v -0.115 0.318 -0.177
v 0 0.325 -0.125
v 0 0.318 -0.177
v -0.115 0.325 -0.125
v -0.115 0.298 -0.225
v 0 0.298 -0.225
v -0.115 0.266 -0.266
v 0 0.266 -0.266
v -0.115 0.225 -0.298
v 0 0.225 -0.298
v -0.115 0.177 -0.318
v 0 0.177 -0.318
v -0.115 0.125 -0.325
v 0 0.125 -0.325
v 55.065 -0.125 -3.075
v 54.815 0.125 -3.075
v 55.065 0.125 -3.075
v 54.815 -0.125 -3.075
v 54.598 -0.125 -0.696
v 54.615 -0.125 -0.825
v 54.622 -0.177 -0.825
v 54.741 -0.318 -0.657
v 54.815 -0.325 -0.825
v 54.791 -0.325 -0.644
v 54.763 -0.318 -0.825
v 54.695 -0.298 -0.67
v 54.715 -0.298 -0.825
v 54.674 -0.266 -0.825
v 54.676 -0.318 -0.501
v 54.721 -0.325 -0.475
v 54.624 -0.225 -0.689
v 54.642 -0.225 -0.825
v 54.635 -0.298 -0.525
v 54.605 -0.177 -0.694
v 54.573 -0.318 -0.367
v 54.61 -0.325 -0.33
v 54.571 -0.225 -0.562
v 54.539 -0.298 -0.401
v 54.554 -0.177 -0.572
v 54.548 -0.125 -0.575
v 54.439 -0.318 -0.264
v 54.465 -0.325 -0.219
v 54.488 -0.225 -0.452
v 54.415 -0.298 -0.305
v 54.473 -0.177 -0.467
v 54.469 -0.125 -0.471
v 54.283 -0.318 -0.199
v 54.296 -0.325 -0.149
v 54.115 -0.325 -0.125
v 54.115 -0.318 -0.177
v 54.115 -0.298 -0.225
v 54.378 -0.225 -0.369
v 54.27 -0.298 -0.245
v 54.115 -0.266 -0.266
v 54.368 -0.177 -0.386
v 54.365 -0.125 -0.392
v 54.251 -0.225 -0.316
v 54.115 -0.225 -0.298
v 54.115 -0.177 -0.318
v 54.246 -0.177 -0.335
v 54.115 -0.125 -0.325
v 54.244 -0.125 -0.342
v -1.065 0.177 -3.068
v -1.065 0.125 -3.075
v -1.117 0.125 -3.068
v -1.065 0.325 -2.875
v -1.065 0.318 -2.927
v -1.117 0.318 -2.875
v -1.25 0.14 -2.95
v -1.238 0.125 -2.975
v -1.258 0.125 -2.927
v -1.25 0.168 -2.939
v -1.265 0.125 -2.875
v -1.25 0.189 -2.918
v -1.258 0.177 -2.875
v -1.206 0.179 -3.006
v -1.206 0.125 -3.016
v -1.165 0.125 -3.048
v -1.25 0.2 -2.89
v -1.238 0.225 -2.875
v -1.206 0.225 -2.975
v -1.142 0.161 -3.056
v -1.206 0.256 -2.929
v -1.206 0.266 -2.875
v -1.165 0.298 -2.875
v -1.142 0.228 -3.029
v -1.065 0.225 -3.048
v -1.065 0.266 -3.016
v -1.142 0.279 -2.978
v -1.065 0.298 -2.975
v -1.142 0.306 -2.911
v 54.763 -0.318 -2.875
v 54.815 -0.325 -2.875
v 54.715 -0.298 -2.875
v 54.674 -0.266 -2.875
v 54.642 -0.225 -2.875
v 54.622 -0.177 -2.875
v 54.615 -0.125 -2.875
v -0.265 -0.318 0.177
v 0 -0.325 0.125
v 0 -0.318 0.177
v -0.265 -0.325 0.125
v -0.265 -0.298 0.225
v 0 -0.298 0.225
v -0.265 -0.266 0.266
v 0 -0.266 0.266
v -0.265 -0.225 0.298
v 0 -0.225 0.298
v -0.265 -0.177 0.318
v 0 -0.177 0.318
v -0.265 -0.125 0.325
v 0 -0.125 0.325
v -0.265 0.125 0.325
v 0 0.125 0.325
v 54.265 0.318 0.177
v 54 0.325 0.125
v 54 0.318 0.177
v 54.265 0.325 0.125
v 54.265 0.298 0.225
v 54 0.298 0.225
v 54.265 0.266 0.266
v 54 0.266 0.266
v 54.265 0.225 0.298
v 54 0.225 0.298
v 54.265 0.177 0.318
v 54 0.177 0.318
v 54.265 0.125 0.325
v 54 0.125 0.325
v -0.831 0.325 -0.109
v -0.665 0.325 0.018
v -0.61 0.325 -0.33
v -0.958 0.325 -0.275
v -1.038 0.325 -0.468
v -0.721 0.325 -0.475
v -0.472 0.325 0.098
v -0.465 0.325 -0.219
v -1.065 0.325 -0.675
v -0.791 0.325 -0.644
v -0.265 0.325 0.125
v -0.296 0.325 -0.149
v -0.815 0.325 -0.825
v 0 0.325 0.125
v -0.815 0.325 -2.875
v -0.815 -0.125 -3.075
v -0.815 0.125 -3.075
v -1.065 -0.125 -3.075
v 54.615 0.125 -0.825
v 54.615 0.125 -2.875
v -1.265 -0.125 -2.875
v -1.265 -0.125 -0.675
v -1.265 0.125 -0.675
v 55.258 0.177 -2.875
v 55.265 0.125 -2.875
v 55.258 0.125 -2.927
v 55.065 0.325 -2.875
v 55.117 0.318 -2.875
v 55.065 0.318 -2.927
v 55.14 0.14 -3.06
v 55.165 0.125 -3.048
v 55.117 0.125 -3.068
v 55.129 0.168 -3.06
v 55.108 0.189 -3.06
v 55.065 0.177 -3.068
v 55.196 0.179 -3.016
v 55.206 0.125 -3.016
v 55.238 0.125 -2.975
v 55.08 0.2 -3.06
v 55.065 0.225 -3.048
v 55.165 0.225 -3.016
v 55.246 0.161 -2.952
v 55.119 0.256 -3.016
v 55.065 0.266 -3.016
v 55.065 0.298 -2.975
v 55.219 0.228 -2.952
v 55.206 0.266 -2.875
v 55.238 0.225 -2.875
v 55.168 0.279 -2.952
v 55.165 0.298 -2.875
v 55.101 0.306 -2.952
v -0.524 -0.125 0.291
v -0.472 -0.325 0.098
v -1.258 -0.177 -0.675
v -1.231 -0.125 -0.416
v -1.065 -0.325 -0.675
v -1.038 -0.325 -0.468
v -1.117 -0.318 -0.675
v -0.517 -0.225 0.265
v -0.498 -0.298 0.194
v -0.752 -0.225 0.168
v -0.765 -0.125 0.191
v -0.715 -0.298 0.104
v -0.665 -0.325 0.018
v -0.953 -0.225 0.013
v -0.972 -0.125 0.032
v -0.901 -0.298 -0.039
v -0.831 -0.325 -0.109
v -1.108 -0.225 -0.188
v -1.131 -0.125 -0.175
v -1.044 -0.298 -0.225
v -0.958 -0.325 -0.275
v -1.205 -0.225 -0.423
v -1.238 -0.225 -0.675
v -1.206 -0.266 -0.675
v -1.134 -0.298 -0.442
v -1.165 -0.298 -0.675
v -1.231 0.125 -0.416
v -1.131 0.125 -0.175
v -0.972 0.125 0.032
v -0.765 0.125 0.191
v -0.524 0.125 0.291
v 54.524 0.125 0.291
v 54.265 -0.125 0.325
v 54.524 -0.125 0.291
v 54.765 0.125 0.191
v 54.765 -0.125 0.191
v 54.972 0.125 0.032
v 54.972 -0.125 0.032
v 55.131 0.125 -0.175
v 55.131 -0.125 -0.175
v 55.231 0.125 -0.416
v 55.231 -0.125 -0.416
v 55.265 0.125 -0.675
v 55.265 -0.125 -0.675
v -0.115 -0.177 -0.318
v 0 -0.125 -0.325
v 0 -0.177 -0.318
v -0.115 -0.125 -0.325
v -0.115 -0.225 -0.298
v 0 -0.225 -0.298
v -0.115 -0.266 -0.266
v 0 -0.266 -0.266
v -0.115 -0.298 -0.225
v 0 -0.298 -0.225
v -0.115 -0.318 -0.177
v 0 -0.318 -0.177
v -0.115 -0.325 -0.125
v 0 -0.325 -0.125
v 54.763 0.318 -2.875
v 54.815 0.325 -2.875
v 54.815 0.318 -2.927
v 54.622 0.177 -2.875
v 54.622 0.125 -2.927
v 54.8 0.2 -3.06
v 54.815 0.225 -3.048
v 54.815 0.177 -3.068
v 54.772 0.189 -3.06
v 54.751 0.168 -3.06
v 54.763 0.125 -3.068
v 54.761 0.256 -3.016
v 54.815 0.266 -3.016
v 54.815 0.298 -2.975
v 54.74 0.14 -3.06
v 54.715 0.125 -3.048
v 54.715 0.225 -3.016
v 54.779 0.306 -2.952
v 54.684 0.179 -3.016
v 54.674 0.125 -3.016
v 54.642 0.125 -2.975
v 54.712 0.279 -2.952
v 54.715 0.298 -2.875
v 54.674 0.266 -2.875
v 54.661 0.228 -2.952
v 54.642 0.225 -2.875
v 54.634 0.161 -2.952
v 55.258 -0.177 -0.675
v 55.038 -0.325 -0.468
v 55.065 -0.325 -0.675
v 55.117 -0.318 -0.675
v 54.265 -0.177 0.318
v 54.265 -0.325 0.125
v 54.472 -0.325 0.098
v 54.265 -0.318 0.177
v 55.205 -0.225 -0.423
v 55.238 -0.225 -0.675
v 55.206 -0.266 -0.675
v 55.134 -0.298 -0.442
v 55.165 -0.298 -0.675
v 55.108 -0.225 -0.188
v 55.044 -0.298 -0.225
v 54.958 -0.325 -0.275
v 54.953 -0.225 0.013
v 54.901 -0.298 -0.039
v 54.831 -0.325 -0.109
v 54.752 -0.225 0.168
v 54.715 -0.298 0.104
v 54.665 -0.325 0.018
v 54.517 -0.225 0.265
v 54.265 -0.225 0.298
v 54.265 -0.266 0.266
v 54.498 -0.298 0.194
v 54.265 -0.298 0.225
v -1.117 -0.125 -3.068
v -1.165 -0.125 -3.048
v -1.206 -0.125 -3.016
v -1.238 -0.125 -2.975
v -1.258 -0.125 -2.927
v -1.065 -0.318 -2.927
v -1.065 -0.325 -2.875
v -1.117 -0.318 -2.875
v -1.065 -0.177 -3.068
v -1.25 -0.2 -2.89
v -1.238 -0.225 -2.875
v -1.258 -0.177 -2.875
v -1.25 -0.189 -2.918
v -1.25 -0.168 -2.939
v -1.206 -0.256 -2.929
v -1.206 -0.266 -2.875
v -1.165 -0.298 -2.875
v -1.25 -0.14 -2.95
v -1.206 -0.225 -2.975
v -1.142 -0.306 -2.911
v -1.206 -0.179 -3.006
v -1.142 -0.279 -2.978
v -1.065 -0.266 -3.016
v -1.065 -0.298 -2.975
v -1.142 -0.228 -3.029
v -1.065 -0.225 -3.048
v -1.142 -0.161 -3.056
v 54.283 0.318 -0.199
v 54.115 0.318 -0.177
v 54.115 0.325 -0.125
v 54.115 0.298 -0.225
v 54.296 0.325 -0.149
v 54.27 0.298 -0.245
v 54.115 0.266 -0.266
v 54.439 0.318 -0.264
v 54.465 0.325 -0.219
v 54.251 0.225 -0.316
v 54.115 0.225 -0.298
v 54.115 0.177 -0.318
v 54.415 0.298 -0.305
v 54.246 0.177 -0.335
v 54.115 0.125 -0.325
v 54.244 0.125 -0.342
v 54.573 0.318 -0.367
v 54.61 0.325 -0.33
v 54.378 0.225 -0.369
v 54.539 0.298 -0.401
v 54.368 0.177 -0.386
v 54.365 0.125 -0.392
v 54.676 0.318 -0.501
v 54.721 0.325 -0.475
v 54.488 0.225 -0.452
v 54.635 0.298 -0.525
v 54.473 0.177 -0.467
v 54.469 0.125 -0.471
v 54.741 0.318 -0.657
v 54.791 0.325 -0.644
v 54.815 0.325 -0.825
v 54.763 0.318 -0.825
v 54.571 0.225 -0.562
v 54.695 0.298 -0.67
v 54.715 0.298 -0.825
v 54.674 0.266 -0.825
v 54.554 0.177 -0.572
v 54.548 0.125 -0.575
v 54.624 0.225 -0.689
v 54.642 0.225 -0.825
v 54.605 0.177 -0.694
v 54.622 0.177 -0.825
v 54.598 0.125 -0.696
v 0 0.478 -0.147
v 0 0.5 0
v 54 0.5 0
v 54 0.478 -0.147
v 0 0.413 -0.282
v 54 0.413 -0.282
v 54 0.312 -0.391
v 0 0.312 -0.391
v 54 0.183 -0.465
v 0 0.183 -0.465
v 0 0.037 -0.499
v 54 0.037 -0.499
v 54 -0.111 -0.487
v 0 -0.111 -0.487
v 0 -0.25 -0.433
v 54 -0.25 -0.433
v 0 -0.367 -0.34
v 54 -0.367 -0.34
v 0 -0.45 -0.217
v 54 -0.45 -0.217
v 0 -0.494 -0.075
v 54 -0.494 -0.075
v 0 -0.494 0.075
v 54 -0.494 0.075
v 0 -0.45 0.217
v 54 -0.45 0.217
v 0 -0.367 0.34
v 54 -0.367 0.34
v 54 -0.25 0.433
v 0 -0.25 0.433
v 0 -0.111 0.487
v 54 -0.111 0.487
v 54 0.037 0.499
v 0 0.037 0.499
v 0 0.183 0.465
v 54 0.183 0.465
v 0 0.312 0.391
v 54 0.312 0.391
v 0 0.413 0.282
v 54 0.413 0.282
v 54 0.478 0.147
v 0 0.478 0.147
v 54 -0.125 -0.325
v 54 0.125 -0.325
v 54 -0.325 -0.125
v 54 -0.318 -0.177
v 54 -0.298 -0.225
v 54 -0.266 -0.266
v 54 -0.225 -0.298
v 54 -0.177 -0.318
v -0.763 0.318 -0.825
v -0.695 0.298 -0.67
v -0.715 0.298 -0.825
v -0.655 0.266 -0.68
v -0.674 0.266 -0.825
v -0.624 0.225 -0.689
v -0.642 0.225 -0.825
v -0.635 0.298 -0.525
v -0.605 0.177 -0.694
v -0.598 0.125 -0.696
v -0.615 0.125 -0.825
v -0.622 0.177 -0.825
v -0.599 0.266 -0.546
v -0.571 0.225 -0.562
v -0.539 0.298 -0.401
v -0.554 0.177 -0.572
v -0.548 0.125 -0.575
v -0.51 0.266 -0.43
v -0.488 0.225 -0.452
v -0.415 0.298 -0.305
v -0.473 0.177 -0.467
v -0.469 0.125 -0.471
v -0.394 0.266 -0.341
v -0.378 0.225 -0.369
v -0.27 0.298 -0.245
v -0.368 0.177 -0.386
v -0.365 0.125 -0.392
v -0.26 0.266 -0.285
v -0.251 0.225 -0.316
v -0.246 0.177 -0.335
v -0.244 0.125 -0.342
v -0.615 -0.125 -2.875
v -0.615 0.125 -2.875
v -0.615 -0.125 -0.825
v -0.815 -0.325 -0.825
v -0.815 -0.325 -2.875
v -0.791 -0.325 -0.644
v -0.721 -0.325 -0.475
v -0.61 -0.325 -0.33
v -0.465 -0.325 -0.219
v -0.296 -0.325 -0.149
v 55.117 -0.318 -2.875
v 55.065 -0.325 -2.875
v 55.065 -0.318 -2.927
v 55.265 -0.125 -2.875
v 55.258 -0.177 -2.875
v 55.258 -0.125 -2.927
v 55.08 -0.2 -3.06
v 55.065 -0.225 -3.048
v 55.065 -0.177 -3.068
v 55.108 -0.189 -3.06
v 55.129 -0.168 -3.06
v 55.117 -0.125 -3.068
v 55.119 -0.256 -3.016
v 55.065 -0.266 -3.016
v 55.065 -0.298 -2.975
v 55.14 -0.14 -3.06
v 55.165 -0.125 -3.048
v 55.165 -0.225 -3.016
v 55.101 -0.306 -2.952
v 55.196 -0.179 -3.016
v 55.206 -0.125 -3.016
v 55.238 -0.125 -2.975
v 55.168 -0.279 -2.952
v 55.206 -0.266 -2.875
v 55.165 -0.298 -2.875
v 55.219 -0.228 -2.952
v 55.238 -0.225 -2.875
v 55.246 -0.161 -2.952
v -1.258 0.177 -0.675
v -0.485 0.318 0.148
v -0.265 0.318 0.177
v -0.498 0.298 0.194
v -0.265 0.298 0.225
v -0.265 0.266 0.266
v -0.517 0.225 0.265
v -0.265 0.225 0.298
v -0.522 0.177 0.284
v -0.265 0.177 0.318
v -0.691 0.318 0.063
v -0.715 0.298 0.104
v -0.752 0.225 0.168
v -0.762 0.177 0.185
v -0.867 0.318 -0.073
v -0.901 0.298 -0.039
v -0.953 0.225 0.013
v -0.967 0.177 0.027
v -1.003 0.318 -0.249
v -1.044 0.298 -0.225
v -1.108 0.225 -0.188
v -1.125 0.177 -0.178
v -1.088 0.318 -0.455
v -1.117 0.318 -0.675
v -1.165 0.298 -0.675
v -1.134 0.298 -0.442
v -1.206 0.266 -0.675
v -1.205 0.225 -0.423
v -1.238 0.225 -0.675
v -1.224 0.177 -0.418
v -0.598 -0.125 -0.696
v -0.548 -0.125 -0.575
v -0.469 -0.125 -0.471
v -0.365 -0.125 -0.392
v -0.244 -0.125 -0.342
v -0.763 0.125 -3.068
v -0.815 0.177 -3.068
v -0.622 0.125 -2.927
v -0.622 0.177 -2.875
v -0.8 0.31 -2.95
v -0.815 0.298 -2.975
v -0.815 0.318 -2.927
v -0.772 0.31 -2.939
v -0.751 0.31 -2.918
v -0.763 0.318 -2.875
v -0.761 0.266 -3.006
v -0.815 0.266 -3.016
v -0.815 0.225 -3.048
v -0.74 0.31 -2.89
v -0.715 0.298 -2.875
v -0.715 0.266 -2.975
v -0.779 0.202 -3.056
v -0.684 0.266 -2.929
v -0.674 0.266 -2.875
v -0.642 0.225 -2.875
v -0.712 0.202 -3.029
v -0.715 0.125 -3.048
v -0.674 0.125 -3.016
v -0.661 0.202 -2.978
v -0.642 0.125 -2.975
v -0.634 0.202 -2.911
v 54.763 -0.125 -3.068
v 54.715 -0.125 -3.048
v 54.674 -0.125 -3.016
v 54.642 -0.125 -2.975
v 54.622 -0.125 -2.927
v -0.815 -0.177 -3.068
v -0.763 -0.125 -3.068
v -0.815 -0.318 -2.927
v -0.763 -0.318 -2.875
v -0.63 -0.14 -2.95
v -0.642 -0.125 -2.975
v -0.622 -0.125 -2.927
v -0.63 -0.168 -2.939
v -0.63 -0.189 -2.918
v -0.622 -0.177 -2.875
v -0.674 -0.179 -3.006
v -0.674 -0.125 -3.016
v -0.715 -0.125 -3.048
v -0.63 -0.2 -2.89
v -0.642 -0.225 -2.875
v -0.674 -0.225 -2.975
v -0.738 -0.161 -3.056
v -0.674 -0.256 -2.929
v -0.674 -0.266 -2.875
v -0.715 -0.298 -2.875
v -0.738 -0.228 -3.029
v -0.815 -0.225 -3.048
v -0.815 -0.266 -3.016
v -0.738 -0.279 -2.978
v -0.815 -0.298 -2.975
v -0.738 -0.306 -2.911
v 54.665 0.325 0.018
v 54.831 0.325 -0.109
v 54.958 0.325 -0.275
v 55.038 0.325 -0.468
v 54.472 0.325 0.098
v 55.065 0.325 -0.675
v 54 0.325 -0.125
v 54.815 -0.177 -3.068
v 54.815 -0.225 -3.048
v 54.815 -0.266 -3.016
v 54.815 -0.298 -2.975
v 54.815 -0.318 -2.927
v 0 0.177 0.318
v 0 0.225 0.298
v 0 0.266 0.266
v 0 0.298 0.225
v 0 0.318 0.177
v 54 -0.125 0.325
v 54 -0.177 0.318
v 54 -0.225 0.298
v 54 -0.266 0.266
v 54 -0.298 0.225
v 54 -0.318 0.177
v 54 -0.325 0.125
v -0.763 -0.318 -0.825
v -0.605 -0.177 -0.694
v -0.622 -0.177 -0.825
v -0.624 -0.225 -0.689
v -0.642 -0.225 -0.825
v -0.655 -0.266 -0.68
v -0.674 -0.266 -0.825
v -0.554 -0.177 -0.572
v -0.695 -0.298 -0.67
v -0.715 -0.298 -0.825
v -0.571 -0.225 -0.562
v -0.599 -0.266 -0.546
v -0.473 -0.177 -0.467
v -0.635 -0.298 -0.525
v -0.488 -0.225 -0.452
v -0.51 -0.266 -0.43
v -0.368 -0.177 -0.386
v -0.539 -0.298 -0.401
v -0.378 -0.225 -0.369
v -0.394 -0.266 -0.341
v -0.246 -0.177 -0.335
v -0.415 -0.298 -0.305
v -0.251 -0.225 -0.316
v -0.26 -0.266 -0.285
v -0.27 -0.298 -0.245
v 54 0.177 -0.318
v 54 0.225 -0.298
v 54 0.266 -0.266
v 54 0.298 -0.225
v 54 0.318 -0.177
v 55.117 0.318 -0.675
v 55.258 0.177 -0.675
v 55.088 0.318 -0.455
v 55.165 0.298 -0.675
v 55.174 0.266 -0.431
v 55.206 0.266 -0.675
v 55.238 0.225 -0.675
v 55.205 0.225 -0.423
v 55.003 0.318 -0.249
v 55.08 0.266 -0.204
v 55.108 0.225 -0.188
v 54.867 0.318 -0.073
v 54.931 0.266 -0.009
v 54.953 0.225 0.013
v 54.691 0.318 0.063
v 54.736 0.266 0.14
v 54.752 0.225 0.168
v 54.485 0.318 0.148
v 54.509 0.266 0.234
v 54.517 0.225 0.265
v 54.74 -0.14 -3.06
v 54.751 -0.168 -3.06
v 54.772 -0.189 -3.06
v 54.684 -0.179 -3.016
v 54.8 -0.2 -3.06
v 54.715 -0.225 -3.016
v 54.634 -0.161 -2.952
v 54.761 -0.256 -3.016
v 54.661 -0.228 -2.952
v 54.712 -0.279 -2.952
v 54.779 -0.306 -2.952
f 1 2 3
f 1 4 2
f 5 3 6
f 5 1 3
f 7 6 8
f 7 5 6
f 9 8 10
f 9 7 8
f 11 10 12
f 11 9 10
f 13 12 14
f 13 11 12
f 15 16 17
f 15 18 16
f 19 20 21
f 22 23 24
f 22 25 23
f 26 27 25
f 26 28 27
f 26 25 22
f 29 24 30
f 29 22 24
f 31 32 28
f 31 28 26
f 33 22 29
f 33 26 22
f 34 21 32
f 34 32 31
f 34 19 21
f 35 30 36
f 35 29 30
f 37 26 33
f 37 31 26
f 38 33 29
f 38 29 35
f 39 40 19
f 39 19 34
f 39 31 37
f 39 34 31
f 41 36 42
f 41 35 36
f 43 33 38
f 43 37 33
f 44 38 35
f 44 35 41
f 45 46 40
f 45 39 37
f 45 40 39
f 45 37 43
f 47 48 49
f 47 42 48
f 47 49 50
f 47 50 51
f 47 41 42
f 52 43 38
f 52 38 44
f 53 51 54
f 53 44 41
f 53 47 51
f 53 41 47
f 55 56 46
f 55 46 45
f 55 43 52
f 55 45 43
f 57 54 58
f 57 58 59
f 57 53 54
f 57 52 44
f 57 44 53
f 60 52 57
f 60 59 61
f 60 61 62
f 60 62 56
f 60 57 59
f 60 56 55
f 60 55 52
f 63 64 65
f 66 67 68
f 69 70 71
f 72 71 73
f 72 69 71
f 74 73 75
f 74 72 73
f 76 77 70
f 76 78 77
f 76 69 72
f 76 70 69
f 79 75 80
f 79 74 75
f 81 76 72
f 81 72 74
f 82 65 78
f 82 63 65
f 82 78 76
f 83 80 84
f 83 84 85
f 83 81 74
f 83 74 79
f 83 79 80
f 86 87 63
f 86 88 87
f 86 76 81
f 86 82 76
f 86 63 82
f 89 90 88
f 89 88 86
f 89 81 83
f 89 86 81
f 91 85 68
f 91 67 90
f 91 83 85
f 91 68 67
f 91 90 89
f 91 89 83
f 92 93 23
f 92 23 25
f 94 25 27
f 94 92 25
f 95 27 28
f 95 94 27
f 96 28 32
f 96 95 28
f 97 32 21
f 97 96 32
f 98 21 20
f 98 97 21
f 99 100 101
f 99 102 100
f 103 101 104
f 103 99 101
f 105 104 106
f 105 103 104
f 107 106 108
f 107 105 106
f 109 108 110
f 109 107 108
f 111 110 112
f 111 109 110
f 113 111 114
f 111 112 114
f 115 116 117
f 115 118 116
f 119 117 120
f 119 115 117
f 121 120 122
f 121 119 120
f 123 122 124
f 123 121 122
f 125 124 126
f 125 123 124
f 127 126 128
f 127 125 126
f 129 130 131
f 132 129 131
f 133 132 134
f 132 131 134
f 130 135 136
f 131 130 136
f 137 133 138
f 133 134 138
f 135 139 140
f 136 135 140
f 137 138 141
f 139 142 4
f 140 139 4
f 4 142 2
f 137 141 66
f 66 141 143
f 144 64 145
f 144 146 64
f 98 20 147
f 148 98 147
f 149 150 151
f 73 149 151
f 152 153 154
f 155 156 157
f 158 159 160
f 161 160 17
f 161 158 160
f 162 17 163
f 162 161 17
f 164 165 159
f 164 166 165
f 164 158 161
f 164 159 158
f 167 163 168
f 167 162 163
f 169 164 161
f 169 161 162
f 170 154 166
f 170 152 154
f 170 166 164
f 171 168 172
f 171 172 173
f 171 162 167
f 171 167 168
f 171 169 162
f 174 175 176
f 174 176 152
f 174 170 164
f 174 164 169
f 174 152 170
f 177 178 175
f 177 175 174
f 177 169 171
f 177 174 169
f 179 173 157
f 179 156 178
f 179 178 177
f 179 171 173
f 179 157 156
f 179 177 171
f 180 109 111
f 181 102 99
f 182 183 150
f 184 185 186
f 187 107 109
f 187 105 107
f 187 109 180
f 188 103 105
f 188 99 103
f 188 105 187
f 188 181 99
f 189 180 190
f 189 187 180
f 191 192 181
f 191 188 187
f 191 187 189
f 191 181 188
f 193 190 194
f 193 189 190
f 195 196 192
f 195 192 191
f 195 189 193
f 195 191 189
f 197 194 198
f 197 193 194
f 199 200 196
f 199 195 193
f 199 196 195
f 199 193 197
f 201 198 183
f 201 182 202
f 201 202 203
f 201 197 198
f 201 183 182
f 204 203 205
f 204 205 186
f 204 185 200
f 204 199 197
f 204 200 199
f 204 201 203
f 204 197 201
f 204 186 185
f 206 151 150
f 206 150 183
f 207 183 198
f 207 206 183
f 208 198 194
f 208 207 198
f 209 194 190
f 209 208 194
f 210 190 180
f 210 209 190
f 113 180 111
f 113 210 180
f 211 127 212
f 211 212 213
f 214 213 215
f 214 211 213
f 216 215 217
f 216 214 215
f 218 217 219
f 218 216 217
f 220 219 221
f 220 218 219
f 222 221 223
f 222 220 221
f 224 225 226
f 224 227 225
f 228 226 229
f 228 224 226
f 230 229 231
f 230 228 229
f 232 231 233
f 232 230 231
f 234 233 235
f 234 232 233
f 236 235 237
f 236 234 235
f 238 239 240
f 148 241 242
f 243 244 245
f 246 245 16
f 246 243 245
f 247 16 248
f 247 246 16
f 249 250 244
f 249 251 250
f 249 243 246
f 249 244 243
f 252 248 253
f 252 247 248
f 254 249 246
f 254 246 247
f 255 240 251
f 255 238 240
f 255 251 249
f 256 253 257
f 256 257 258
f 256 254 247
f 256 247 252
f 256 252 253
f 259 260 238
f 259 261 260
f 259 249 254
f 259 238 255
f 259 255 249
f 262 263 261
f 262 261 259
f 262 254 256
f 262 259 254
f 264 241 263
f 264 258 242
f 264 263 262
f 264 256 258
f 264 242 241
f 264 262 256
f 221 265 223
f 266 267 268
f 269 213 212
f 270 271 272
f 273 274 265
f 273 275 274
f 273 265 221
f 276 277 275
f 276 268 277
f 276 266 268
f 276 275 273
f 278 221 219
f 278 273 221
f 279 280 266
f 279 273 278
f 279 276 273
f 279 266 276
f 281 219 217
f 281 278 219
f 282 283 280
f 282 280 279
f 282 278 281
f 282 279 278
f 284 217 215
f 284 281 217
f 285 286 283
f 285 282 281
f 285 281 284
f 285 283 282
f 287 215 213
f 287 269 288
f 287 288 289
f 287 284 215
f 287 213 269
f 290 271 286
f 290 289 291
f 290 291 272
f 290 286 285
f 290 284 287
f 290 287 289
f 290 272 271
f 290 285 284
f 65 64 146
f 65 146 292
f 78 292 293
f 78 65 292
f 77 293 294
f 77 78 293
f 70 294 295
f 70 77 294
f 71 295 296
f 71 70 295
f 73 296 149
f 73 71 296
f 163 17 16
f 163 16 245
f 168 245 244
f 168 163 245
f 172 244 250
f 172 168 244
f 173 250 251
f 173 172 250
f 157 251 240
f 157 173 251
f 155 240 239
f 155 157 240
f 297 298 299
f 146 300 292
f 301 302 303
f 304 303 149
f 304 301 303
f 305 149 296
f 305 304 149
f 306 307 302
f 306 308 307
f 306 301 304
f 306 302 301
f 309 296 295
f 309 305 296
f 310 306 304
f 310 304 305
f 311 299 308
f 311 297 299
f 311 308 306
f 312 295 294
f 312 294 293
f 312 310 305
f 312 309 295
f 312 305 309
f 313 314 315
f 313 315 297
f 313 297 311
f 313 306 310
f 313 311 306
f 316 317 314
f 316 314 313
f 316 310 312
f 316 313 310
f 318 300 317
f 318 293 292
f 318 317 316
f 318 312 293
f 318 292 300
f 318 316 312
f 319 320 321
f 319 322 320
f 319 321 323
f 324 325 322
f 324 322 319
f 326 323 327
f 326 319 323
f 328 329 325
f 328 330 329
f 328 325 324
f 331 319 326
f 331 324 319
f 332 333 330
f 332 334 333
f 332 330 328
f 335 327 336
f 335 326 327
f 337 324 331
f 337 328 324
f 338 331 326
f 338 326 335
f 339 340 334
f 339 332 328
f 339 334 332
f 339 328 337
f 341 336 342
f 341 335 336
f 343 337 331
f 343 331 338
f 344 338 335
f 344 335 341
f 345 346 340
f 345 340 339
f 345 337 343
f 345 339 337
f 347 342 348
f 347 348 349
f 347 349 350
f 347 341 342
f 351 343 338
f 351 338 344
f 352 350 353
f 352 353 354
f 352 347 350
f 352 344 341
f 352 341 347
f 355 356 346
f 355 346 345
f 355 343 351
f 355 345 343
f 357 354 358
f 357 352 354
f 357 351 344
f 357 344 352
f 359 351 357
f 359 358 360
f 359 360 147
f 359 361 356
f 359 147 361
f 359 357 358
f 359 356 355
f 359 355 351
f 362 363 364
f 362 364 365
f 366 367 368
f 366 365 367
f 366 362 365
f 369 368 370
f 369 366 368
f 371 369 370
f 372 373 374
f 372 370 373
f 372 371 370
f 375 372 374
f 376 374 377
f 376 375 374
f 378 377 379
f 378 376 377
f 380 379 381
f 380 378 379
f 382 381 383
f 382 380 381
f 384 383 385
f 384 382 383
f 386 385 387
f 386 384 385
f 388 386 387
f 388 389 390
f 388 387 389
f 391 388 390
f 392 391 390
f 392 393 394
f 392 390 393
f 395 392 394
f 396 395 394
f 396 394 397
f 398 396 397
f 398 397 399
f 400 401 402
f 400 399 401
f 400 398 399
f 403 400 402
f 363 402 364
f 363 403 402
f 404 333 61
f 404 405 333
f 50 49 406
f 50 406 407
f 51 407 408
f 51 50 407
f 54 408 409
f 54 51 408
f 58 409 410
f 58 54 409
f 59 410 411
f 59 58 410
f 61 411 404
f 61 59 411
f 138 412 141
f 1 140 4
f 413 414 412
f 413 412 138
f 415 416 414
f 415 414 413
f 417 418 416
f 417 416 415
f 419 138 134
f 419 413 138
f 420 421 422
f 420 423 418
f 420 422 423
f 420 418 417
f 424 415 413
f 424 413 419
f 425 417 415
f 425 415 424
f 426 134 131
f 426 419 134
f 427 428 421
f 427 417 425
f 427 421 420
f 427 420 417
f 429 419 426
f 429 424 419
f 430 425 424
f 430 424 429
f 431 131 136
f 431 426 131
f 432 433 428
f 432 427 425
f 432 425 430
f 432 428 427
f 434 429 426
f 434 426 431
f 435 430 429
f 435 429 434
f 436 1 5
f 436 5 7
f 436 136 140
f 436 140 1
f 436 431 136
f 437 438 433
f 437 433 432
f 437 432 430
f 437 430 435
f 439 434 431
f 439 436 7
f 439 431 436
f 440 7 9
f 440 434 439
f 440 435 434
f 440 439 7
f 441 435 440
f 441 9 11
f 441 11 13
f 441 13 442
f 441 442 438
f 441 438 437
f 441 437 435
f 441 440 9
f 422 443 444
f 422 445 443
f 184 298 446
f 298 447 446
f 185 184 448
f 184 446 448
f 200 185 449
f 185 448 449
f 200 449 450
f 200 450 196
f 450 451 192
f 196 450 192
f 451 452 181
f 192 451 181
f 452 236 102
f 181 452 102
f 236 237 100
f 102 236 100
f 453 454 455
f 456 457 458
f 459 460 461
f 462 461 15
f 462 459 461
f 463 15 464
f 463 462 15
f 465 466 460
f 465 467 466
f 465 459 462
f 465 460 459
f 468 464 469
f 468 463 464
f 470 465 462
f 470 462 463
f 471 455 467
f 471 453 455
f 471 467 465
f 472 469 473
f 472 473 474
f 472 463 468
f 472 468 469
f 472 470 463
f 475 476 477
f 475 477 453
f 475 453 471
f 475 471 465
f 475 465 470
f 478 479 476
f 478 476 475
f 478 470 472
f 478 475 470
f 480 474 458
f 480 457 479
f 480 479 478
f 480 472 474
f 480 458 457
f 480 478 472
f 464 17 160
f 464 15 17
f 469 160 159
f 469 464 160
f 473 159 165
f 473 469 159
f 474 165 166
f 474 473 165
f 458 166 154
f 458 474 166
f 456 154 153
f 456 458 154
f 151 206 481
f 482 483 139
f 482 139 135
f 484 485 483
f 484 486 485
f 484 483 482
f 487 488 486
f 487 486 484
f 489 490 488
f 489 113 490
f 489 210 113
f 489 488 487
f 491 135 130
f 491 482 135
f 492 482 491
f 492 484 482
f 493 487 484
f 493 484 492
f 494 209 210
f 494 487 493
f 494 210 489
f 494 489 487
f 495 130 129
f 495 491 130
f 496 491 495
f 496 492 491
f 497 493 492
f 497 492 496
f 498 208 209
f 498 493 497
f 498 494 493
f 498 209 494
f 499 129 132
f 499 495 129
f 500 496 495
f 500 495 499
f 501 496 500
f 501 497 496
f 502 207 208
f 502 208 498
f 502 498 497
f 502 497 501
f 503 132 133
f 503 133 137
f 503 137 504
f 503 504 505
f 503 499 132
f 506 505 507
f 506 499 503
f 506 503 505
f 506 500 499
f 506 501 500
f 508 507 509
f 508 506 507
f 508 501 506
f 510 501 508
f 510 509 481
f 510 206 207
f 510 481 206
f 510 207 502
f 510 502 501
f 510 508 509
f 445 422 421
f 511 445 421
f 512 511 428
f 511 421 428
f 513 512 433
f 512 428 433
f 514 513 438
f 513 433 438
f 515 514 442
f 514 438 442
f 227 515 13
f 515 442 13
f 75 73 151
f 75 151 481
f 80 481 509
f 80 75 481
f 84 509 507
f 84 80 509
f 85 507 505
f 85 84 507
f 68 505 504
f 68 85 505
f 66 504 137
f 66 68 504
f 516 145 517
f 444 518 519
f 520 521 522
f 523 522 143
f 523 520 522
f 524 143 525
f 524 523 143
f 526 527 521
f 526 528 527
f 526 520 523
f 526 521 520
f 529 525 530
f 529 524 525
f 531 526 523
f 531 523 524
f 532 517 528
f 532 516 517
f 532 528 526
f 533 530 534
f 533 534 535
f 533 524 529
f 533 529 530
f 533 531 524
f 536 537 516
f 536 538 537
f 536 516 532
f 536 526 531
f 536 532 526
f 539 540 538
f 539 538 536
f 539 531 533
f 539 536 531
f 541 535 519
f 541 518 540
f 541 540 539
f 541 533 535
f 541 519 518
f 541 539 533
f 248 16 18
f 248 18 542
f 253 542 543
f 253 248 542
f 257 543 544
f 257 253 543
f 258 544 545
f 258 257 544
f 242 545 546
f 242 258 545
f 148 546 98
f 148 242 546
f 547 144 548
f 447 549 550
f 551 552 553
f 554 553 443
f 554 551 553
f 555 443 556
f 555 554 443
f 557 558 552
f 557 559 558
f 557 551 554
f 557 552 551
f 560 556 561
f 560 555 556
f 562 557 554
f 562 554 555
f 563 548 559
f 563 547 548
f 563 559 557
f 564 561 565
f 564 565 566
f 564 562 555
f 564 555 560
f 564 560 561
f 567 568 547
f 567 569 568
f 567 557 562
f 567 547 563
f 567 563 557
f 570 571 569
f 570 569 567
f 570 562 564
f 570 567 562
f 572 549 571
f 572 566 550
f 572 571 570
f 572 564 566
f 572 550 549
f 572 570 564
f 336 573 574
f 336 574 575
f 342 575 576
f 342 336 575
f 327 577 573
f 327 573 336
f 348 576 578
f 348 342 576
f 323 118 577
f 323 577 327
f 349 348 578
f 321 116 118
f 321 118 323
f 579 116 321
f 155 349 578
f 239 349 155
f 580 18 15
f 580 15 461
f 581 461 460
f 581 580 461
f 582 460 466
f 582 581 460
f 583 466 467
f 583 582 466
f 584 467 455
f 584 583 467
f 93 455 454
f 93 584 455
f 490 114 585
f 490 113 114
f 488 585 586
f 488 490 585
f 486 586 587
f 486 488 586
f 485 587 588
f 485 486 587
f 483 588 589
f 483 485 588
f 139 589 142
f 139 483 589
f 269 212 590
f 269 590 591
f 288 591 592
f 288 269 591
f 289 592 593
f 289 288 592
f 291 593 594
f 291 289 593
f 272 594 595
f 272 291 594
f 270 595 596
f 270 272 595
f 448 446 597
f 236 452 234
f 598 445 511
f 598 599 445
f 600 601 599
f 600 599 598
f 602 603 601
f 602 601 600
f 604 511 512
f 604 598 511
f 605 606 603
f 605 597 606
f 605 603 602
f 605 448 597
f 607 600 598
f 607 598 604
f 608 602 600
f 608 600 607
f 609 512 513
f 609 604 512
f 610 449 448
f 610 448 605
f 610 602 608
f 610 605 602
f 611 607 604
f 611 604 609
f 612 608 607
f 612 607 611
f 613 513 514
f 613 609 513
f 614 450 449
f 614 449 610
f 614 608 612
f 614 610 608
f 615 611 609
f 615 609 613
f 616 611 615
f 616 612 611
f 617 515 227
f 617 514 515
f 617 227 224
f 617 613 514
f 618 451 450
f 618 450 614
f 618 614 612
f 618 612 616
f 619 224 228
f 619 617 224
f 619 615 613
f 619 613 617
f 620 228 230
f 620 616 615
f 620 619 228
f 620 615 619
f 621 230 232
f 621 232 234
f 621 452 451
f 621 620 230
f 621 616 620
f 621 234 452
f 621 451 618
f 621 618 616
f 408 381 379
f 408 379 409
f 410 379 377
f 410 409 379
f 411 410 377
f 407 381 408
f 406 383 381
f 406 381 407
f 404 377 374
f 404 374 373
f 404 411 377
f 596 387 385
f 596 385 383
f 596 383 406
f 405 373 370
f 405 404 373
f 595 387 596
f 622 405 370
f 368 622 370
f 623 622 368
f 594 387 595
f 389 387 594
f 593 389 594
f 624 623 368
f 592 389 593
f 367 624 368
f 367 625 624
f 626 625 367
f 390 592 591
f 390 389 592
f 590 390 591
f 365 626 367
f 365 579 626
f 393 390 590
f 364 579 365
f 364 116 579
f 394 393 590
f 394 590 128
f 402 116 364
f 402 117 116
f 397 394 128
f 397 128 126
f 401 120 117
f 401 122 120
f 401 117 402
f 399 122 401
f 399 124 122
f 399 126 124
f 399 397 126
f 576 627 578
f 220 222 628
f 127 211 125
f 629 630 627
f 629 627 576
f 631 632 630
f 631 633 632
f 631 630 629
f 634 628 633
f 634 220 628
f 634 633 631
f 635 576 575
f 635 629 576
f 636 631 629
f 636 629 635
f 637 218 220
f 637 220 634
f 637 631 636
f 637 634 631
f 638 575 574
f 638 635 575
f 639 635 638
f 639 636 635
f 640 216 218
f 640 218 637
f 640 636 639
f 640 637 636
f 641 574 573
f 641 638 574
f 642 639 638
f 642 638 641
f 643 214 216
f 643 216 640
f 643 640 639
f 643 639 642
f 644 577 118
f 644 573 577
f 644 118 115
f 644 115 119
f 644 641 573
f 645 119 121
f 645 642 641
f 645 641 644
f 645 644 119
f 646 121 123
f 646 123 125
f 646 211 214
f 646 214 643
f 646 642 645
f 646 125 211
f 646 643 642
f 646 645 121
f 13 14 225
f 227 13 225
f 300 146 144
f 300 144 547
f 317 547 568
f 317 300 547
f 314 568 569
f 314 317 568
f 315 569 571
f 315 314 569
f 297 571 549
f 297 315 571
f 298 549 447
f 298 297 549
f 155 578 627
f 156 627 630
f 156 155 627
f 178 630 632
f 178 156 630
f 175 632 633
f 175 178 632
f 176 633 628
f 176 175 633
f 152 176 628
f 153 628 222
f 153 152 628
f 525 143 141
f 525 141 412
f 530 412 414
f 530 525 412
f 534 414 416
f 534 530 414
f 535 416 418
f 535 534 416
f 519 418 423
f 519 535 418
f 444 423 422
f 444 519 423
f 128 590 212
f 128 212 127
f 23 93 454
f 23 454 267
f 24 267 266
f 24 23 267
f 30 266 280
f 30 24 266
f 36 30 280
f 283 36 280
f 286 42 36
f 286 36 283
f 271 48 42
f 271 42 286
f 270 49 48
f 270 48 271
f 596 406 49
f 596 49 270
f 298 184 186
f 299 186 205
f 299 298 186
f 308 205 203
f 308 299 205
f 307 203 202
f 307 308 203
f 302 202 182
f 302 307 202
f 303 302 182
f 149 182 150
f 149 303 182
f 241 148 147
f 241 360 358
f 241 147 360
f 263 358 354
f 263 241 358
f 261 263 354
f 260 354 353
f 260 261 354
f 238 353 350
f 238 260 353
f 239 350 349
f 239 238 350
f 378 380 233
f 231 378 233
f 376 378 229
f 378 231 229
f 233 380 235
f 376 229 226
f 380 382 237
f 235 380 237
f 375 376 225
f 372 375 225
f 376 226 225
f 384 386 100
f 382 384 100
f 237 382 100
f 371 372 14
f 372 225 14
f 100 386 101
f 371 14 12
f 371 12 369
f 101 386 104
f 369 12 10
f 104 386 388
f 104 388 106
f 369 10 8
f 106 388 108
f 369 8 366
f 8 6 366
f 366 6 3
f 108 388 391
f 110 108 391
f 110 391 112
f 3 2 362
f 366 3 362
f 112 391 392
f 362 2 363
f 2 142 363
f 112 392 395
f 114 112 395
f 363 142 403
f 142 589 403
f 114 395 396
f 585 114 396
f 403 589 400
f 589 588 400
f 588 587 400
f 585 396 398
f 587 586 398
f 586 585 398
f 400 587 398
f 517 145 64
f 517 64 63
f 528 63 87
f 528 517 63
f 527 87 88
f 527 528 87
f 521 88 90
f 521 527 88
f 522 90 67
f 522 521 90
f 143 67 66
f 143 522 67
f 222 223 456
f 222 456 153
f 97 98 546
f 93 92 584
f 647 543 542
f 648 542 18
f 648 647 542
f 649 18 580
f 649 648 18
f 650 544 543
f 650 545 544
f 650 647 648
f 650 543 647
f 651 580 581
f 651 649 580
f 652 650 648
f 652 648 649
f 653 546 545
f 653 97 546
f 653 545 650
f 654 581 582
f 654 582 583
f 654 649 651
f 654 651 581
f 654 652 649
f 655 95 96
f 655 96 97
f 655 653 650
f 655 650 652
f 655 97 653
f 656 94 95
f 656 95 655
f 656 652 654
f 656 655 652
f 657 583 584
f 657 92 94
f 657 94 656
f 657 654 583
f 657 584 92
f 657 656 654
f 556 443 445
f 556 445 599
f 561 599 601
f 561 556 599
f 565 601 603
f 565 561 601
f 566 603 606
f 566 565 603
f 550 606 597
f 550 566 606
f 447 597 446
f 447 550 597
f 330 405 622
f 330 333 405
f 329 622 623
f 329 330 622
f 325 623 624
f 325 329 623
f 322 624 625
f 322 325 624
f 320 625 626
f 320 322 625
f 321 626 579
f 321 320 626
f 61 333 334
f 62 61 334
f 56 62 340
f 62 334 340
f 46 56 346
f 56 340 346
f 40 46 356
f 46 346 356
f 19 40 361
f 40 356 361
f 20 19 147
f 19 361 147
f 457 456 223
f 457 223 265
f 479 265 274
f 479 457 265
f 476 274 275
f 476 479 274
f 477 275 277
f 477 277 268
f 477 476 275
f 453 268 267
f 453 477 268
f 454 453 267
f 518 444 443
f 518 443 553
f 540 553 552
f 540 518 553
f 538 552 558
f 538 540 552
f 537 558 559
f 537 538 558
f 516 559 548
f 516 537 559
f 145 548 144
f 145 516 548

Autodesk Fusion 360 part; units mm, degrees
sketch "Sketch1" plane through (0, 0, 0) normal (1, 0, 0) x (0, 1, 0)
  circle A0 centre (0, 0) radius 0.5
  line L0 (0.325, -0.325) -> (-0.325, -0.325)
  line L1 (-0.325, -0.325) -> (-0.325, 0.325)
  line L2 (-0.325, 0.325) -> (0.325, 0.325)
  line L3 (0.325, 0.325) -> (0.325, -0.325)
  line L4 (0.325, -0.325) -> (-0.325, 0.325) construction
  line L5 (-0.325, -0.325) -> (0.325, 0.325) construction
  dimension "d1" = 1
  dimension "d2" = 0.65
  dimension "d3" = 0.65
extrude "Extrude1" add sketch "Sketch1" along normal blind 54 contours A0 | L0 L1 L2 L3
sketch "Sketch2" plane through (54, 0, 0) normal (1, 0, 0) x (0, 1, 0)
  circle A0 centre (0, 0) radius 0.5
  line L0 (0.325, -0.325) -> (-0.325, -0.325)
  line L1 (-0.325, -0.325) -> (-0.325, 0.325)
  line L2 (-0.325, 0.325) -> (0.325, 0.325)
  line L3 (0.325, 0.325) -> (0.325, -0.325)
  line L4 (0.325, -0.325) -> (-0.325, 0.325) construction
  line L5 (-0.325, -0.325) -> (0.325, 0.325) construction
  dimension "d8" = 0.65
  dimension "d9" = 0.65
extrude "Extrude2" add sketch "Sketch2" along normal blind 1.265 contours L0 L1 L2 L3
extrude "Extrude3" add sketch "Sketch1" against normal blind 1.265 contours L0 L1 L2 L3
sketch "Sketch3" plane through (0, 0, -0.325) normal (0, 0, -1) x (1, 0, 0)
  line L0 (54, 0.325) -> (54, -0.325)
  line L1 (54, -0.325) -> (55.265, -0.325)
  line L2 (55.265, -0.325) -> (55.265, 0.325)
  line L3 (55.265, 0.325) -> (54, 0.325)
  line L4 (55.265, 0.325) -> (54.615, 0.325)
  line L5 (54.615, 0.325) -> (54.615, -0.325)
  line L6 (54.615, -0.325) -> (55.265, -0.325)
  line L7 (55.265, -0.325) -> (55.265, 0.325)
  line L8 (55.265, 0.325) -> (54.615, -0.325) construction
  line L9 (54.615, 0.325) -> (55.265, -0.325) construction
  point P0 (54.94, 0)
  dimension "d14" = 0.65
  dimension "d15" = 0.65
sketch "Sketch4" plane through (0, 0, -0.325) normal (0, 0, -1) x (1, 0, 0)
  line L0 (0, -0.325) -> (0, 0.325)
  line L1 (0, 0.325) -> (-1.265, 0.325)
  line L2 (-1.265, 0.325) -> (-1.265, -0.325)
  line L3 (-1.265, -0.325) -> (0, -0.325)
  line L4 (-0.615, -0.325) -> (-1.265, -0.325)
  line L5 (-1.265, -0.325) -> (-1.265, 0.325)
  line L6 (-1.265, 0.325) -> (-0.615, 0.325)
  line L7 (-0.615, 0.325) -> (-0.615, -0.325)
  line L8 (-0.615, -0.325) -> (-1.265, 0.325) construction
  line L9 (-1.265, -0.325) -> (-0.615, 0.325) construction
  point P0 (-0.94, 0)
  dimension "d17" = 0.65
  dimension "d18" = 0.65
extrude "Extrude4" add sketch "Sketch4" sketch "Sketch3" along normal blind 2.75 contours L1 L2 L3 L4 L5 L6 L7 of sketch 2 contours L1 L2 L3 L4 L5 L6 L7
fillet "Fillet1" radius 0.5 2 edges at (-0.615, 0, -0.325) (54.615, 0, -0.325)
fillet "Fillet2" radius 1 2 edges at (-1.265, 0, 0.325) (55.265, 0, 0.325)
fillet "Fillet3" radius 0.2 28 edges at (-0.94, -0.325, -3.075) (-0.615, 0, -3.075) (-0.94, 0.325, -3.075) (-1.265, 0, -3.075) (-0.4686, -0.325, -0.4714) (-0.615, -0.325, -1.95) (-0.1325, -0.325, 0.325) (-0.9721, -0.325, 0.0321) (-1.265, -0.325, -1.875) (-0.1325, 0.325, 0.325) (-0.9721, 0.325, 0.0321) (-1.265, 0.325, -1.875) (-0.4686, 0.325, -0.4714) (-0.615, 0.325, -1.95) (54.1325, -0.325, 0.325) (54.9721, -0.325, 0.0321) (55.265, -0.325, -1.875) (54.615, -0.325, -1.95) (54.4686, -0.325, -0.4714) (55.265, 0.325, -1.875) (54.9721, 0.325, 0.0321) (54.1325, 0.325, 0.325) (54.4686, 0.325, -0.4714) (54.615, 0.325, -1.95) (54.94, 0.325, -3.075) (55.265, 0, -3.075) (54.94, -0.325, -3.075) (54.615, 0, -3.075)
equation "d1 = width"
equation "d2 = d3"
equation "d3 = d1 * 0.65"
equation "width = 1 mm"
equation "baseLenght = 54 mm"
equation "d6 = baseLenght"
equation "d8 = width * 0.65"
equation "d9 = d8"
equation "d10 = ( ( 2.54 * ceil(( baseLenght + 1.3 * width ) / 2.54 mm) ) * 1 mm + 0.65 * width - baseLenght ) / 2"
equation "d12 = -( ( 2.54 * ceil(( baseLenght + 1.3 * width ) / 2.54 mm) ) * 1 mm + 0.65 * width - baseLenght ) / 2"
equation "d14 = width * 0.65"
equation "d15 = d14"
equation "d17 = width * 0.65"
equation "d18 = d17"
equation "d26 = 0.2 * width"
